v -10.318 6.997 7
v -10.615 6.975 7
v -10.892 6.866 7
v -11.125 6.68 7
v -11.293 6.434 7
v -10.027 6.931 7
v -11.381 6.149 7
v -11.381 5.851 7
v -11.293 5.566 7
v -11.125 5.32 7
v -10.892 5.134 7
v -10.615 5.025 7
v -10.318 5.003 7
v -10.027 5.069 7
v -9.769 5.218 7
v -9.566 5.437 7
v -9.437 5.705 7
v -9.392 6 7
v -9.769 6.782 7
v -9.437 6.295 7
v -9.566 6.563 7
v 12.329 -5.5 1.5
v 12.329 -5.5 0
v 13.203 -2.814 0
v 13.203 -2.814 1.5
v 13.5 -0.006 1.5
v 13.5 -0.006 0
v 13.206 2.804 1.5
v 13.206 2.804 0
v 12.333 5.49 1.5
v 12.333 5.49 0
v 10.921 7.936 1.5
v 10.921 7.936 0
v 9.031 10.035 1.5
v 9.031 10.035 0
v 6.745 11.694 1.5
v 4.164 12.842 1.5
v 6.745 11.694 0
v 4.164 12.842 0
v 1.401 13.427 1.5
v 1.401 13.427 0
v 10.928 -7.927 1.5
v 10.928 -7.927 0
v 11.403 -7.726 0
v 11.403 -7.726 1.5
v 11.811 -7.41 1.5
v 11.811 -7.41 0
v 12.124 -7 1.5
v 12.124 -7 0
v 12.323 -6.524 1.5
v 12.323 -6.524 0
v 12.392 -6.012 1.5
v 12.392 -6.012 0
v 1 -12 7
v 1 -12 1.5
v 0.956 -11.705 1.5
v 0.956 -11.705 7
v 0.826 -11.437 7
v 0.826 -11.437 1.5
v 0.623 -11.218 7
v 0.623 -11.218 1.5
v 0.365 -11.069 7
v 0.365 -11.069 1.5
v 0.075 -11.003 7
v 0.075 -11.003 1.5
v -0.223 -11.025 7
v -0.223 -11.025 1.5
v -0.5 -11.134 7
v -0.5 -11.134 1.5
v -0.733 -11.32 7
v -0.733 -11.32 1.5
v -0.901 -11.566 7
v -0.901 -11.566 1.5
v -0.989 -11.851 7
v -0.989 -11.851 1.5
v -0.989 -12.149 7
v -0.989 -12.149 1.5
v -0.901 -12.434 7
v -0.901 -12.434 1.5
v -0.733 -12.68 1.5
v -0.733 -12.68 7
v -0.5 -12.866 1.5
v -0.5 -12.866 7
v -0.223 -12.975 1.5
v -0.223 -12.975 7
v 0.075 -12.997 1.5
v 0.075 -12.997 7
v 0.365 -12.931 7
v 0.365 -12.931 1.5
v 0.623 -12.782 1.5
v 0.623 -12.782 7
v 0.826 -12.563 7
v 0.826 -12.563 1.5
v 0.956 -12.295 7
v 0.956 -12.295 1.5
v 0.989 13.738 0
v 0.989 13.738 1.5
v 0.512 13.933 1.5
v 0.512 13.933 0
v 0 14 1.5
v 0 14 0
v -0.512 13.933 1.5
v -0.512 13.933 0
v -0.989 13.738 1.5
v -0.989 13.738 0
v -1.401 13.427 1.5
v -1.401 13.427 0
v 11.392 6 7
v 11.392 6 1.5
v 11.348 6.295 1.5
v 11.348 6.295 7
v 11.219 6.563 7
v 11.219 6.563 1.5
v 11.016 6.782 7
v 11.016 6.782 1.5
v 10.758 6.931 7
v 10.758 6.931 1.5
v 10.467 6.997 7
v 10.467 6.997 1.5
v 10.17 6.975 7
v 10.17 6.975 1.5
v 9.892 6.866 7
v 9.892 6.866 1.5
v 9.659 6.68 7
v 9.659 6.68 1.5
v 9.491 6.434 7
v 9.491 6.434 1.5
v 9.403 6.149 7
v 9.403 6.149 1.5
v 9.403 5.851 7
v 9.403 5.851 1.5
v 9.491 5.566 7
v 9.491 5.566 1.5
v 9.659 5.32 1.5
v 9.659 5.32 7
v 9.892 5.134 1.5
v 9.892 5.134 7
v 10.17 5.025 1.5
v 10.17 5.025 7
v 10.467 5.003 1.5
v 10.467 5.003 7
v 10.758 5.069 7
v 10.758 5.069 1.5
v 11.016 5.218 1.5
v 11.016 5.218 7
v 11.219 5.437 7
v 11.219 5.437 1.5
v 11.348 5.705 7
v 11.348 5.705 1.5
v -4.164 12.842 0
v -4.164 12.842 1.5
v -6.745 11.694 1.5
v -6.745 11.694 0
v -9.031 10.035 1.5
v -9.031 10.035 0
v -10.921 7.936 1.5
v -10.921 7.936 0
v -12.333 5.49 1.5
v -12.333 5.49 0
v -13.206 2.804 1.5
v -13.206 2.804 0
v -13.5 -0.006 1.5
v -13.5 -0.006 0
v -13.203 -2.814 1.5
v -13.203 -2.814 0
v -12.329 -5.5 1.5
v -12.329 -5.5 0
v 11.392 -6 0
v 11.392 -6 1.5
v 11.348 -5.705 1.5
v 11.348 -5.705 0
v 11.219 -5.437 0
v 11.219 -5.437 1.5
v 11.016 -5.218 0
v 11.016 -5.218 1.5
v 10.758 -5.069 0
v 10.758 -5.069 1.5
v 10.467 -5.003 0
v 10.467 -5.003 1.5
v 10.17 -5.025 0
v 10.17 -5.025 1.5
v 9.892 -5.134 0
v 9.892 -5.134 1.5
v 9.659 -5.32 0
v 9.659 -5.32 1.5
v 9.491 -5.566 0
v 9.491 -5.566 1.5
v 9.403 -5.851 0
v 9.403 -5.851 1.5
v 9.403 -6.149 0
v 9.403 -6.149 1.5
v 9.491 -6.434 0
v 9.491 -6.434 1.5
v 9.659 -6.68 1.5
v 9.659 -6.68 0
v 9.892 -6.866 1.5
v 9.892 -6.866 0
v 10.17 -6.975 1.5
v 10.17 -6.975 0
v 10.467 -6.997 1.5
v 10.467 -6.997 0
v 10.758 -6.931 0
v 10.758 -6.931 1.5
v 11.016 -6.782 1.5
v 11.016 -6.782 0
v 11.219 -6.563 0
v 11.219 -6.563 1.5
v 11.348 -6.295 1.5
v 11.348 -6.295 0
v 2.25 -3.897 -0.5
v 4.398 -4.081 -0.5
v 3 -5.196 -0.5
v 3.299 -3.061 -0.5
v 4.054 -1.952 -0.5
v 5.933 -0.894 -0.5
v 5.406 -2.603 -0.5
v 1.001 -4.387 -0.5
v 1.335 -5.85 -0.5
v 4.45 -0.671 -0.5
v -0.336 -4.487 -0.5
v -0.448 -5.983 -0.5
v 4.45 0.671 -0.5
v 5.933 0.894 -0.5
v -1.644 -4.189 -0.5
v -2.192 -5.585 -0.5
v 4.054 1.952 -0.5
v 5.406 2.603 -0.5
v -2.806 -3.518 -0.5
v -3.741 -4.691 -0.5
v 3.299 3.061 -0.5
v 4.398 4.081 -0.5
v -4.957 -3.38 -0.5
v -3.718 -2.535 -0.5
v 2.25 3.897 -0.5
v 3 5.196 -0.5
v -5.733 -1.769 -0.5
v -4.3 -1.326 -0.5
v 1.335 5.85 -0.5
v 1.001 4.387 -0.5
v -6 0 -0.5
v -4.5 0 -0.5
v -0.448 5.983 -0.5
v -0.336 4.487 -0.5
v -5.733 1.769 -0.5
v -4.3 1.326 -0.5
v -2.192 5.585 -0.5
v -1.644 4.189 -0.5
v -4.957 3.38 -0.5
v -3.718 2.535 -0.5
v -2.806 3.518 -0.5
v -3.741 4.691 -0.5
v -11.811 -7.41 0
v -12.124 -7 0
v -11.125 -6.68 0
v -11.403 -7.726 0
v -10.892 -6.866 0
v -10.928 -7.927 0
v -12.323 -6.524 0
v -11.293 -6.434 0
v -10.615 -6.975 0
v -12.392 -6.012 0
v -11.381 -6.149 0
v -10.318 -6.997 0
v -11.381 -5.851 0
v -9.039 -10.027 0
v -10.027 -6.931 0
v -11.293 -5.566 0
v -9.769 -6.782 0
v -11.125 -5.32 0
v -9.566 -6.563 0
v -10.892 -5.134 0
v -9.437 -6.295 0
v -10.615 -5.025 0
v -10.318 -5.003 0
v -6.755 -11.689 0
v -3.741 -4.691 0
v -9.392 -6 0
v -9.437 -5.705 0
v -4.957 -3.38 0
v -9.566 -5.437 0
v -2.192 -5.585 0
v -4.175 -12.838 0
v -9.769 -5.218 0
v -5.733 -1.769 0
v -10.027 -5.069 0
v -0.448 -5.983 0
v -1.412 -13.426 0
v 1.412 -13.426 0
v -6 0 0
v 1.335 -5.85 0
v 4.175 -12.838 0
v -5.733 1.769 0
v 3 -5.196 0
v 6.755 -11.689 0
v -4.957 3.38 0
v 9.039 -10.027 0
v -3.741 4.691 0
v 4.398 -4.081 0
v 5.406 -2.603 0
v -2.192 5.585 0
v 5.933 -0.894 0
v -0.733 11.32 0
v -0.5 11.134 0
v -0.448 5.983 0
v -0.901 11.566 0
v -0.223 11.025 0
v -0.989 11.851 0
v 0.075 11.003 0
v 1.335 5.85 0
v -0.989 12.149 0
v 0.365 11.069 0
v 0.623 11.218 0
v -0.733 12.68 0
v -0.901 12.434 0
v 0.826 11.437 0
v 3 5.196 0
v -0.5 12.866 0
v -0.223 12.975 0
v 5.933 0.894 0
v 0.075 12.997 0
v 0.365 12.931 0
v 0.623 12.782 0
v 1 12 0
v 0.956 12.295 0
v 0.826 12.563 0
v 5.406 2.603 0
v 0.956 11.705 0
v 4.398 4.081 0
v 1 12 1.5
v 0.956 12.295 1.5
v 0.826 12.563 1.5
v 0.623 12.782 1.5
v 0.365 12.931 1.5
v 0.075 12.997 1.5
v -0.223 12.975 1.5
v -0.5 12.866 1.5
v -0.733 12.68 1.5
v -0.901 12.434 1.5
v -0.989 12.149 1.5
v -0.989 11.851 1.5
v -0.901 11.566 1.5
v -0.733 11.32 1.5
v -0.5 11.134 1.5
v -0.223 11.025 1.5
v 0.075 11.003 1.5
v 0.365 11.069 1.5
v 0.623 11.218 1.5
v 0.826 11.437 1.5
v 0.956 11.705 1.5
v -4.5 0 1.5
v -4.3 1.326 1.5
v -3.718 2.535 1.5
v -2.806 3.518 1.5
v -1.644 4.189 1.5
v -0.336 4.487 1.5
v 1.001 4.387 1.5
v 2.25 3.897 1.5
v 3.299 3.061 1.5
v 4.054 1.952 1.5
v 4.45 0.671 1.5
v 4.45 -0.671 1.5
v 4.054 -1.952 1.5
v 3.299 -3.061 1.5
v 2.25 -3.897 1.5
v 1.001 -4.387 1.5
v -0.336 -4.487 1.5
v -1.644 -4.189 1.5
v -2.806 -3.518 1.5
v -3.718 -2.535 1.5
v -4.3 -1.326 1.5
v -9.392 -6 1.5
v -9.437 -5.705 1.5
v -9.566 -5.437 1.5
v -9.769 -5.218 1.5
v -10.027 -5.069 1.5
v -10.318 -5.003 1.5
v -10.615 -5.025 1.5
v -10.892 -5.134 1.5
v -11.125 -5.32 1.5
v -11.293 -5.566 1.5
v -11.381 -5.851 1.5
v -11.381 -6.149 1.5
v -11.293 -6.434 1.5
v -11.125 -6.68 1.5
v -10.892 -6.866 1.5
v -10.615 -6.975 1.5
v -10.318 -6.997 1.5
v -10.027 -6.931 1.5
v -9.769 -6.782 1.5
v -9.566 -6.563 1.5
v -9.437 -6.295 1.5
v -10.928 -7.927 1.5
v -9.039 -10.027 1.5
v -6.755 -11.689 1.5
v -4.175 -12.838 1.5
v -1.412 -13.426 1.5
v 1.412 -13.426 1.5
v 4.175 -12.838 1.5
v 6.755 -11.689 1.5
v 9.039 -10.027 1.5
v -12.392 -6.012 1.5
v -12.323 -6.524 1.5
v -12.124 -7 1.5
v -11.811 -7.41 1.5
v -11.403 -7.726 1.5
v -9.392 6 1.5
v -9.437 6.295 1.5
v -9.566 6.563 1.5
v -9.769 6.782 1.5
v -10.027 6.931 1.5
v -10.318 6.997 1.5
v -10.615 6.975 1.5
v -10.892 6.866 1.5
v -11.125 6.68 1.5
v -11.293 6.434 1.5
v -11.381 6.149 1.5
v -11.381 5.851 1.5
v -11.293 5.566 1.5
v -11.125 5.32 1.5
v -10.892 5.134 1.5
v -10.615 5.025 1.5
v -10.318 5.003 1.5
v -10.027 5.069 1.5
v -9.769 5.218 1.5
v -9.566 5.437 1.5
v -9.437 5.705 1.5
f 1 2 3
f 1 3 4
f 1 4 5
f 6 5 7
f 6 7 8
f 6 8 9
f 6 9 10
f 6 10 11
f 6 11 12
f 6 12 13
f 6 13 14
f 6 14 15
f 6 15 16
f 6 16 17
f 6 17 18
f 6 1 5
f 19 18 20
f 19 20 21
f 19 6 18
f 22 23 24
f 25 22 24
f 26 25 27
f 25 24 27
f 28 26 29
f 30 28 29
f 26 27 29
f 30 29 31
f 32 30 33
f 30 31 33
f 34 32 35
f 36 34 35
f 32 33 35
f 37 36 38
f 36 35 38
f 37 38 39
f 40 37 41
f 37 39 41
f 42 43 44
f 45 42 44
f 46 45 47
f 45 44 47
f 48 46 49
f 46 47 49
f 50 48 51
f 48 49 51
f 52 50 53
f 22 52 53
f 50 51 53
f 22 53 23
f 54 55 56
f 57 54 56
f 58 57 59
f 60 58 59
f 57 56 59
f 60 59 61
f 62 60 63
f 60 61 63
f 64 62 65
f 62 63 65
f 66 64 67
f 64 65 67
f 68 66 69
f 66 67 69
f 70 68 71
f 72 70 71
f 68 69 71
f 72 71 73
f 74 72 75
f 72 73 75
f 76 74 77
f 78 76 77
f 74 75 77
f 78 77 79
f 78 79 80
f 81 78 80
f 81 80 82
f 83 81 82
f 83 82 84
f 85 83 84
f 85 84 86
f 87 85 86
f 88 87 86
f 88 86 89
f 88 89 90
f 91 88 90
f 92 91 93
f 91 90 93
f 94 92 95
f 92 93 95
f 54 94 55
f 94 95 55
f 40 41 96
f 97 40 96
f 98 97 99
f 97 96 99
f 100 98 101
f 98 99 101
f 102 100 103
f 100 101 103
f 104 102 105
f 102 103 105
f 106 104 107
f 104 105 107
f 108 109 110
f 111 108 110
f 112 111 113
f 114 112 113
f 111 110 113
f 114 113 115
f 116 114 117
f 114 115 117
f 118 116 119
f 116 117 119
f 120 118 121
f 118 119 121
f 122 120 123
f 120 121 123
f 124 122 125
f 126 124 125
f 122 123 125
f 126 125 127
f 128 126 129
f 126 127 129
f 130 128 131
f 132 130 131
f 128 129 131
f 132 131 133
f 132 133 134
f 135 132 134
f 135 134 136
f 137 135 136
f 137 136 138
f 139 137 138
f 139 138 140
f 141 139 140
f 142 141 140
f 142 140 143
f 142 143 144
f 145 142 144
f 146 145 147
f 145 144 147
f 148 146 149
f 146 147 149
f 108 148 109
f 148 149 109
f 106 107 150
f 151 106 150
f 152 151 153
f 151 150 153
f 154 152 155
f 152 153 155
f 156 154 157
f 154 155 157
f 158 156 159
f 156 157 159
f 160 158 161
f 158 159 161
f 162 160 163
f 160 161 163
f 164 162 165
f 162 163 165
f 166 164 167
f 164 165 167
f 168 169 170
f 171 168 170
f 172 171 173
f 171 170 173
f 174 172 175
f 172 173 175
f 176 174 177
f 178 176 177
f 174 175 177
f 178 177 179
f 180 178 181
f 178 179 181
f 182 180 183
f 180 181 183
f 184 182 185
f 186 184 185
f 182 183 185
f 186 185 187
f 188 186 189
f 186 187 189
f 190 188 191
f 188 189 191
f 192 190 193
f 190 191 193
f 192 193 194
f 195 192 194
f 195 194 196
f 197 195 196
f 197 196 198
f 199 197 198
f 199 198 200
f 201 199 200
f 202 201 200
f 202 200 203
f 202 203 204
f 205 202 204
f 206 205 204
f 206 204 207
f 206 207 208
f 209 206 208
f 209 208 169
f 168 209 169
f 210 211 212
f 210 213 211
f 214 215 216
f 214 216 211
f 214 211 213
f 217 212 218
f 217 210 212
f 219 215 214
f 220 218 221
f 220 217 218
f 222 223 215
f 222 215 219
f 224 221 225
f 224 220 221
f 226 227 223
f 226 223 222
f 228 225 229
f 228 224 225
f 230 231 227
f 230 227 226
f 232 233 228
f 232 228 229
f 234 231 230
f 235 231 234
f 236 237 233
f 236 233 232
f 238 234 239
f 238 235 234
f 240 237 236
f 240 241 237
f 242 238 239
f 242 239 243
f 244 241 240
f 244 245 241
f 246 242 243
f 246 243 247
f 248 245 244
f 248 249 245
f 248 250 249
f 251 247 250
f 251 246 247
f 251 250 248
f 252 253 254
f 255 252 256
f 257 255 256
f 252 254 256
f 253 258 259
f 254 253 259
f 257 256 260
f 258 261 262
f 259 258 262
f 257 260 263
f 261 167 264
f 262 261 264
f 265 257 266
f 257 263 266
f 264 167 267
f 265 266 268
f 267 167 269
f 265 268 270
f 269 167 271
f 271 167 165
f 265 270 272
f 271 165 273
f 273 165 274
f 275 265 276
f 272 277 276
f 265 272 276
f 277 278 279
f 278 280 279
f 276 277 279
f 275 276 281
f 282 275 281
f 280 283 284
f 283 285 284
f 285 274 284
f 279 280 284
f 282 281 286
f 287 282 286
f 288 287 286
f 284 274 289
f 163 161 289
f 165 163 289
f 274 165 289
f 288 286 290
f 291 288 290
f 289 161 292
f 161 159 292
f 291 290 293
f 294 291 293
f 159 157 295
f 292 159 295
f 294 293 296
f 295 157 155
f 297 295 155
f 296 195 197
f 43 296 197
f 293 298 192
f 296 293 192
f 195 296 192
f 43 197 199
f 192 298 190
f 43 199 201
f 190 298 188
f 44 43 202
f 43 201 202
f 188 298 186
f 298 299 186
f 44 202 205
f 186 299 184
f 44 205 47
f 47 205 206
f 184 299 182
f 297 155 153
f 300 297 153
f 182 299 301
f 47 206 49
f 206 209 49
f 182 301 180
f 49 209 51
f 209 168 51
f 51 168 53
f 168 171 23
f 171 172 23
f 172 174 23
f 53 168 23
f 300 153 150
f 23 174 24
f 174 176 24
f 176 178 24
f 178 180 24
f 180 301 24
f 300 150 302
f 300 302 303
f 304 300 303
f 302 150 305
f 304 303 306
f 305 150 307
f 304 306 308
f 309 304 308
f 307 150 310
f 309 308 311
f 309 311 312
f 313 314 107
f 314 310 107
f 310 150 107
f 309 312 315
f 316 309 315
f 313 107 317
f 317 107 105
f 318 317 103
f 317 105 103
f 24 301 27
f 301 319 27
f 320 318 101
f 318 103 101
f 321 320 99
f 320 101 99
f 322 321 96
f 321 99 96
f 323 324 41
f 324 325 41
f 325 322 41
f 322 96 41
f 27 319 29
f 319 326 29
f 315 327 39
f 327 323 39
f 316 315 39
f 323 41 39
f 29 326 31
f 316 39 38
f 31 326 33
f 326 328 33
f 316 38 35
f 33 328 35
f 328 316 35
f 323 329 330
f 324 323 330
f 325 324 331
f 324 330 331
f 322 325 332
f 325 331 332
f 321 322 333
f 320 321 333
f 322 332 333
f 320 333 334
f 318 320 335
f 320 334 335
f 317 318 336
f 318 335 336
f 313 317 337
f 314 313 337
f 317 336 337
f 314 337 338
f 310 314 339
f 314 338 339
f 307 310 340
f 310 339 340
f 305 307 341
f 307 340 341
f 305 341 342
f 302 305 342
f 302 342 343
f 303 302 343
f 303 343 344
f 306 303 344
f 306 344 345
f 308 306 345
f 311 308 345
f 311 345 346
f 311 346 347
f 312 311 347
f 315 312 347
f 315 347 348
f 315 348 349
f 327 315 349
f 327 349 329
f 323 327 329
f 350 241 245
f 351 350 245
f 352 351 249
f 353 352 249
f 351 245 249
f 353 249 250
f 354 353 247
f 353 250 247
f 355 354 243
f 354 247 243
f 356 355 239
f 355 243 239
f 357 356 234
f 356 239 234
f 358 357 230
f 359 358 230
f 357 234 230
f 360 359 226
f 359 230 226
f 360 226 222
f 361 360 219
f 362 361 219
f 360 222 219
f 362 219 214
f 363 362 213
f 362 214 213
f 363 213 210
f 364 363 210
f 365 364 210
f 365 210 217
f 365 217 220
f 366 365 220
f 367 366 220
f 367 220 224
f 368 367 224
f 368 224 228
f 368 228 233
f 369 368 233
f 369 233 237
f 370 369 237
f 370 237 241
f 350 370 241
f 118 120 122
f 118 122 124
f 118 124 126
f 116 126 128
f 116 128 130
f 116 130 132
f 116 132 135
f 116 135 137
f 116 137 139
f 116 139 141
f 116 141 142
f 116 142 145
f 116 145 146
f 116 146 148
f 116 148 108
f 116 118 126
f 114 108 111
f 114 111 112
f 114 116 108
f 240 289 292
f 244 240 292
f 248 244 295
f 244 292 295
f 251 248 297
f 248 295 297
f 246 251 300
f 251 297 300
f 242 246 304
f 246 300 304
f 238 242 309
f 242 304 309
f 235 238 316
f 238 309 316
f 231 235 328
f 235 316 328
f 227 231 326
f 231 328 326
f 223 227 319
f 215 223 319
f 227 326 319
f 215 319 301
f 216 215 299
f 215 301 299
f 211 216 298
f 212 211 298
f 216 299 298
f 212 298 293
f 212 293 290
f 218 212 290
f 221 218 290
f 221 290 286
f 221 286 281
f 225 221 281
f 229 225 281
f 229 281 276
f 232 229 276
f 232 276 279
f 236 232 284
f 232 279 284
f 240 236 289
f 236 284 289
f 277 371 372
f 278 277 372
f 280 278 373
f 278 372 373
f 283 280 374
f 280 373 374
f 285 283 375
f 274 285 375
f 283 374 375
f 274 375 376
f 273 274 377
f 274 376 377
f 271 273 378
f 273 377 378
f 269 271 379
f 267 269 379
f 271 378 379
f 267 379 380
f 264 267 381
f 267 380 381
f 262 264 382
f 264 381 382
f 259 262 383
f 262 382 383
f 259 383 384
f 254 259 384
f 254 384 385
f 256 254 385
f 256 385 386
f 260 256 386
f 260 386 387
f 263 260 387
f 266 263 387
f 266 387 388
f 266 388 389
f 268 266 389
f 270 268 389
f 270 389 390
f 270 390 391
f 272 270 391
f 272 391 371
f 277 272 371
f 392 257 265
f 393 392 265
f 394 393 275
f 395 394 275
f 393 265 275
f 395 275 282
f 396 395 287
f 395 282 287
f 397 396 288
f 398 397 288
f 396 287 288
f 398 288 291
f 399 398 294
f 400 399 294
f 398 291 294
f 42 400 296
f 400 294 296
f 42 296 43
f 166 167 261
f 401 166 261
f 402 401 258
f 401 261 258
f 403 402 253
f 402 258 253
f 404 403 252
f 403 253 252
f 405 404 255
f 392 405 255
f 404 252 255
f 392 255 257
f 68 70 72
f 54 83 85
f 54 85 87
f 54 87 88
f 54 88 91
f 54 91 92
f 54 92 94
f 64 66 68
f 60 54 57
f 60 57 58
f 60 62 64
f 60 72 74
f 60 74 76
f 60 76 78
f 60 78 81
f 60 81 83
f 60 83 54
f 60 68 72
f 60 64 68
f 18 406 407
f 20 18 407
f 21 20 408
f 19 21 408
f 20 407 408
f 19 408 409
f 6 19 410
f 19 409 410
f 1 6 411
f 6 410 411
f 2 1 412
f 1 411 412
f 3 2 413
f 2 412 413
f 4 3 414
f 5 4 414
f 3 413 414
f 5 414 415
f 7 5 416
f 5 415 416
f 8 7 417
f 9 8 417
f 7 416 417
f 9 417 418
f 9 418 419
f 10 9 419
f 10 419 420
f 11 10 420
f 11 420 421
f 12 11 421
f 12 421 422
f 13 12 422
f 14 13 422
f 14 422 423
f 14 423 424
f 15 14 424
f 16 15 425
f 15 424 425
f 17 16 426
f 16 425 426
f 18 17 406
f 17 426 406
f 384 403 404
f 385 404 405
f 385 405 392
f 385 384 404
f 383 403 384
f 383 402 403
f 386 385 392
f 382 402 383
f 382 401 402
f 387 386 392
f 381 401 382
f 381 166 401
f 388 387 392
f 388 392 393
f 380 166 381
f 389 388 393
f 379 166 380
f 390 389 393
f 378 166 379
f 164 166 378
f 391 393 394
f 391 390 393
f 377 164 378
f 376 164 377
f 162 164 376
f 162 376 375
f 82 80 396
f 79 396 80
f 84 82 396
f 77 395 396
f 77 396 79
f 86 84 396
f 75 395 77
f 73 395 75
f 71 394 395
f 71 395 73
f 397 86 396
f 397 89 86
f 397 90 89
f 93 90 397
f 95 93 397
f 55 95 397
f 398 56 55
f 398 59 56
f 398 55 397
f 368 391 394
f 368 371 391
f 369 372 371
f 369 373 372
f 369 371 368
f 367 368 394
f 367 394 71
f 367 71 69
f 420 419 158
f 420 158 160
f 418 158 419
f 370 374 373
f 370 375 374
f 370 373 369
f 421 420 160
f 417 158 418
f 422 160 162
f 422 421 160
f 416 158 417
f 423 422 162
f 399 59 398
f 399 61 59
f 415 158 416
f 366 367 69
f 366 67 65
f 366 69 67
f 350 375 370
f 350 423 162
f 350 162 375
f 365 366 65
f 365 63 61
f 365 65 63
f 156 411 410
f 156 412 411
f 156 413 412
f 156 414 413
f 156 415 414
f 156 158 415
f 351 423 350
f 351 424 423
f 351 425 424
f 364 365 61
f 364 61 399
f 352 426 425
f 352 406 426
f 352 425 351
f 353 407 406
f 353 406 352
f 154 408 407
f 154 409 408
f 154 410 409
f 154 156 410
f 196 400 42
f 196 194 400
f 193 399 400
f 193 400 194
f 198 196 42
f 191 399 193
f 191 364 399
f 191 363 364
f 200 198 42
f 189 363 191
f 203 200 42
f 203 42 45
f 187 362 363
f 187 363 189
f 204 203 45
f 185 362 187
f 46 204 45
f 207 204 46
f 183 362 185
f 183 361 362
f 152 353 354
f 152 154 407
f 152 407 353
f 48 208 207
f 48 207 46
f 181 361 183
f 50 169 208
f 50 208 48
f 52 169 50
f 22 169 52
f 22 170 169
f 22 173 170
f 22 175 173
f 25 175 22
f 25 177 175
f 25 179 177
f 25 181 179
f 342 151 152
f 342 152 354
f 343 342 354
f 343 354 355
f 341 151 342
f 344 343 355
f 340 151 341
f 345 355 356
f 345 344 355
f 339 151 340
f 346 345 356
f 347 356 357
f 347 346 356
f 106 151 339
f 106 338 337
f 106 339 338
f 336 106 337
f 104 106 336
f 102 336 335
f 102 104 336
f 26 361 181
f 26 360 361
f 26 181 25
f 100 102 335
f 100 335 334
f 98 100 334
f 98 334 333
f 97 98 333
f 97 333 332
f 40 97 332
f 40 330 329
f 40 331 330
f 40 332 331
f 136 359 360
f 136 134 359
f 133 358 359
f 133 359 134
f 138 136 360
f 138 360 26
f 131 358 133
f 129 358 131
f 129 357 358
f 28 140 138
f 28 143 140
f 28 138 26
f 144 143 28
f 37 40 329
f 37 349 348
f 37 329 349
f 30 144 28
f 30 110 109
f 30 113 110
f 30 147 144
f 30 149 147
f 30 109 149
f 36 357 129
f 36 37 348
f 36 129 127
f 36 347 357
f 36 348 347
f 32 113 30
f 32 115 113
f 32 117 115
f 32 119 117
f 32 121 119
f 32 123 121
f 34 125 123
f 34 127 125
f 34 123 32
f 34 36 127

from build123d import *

# Parameters (mm, degrees)
BASE_EXTRUSION_DEPTH    = 1.5
ESQUISSE2_R             = 1
ENL_V_MAT_EXTRU_1_DEPTH = 2.5
ESQUISSE3_R             = 1
BOSS_EXTRU_1_DEPTH      = 5.5
ESQUISSE4_R             = 6
BOSS_EXTRU_2_DEPTH      = 0.5
ESQUISSE5_R             = 4.5
ENL_V_MAT_EXTRU_2_DEPTH = 8.5


with BuildPart() as part:
    # Esquisse1 → Base-Extrusion (new body)
    with BuildSketch(Plane.XY):
        with BuildLine():
            ThreePointArc((12.328808061, -5.500044708), (11.691342951, 6.75), (1.401225592, 13.427083333))
            ThreePointArc((1.401225592, 13.427083333), (0, 14), (-1.401225592, 13.427083333))
            ThreePointArc((-1.401225592, 13.427083333), (-11.691342951, 6.75), (-12.328808061, -5.500044708))
            ThreePointArc((-12.328808061, -5.500044708), (-12.124355653, -7), (-10.927582469, -7.927038626))
            ThreePointArc((-10.927582469, -7.927038626), (0, -13.5), (10.927582469, -7.927038626))
            ThreePointArc((10.927582469, -7.927038626), (12.124355653, -7), (12.328808061, -5.500044708))
        make_face()
    extrude(amount=BASE_EXTRUSION_DEPTH)

    # Esquisse2 → Enlèv. mat.-Extru.1 (cut, through all)
    with BuildSketch(Plane.XY.offset(1.5)):
        with Locations((0, 12)):
            Circle(ESQUISSE2_R)
        with Locations((10.392304845, -6)):
            Circle(ESQUISSE2_R)
        with Locations((-10.392304845, -6)):
            Circle(ESQUISSE2_R)
    extrude(amount=-ENL_V_MAT_EXTRU_1_DEPTH, mode=Mode.SUBTRACT)

    # Esquisse3 → Boss.-Extru.1 (add)
    with BuildSketch(Plane.XY.offset(1.5)):
        with Locations((10.392304845, 6)):
            Circle(ESQUISSE3_R)
        with Locations((0, -12)):
            Circle(ESQUISSE3_R)
        with Locations((-10.392304845, 6)):
            Circle(ESQUISSE3_R)
    extrude(amount=BOSS_EXTRU_1_DEPTH)

    # Esquisse4 → Boss.-Extru.2 (add)
    with BuildSketch(Plane(origin=(0, 0, 0), x_dir=(-1, 0, 0), z_dir=(0, 0, -1))):
        Circle(ESQUISSE4_R)
    extrude(amount=BOSS_EXTRU_2_DEPTH)

    # Esquisse5 → Enlèv. mat.-Extru.2 (cut, through all)
    with BuildSketch(Plane(origin=(0, 0, -0.5), x_dir=(-1, 0, 0), z_dir=(0, 0, -1))):
        Circle(ESQUISSE5_R)
    extrude(amount=-ENL_V_MAT_EXTRU_2_DEPTH, mode=Mode.SUBTRACT)


solid = part.part
